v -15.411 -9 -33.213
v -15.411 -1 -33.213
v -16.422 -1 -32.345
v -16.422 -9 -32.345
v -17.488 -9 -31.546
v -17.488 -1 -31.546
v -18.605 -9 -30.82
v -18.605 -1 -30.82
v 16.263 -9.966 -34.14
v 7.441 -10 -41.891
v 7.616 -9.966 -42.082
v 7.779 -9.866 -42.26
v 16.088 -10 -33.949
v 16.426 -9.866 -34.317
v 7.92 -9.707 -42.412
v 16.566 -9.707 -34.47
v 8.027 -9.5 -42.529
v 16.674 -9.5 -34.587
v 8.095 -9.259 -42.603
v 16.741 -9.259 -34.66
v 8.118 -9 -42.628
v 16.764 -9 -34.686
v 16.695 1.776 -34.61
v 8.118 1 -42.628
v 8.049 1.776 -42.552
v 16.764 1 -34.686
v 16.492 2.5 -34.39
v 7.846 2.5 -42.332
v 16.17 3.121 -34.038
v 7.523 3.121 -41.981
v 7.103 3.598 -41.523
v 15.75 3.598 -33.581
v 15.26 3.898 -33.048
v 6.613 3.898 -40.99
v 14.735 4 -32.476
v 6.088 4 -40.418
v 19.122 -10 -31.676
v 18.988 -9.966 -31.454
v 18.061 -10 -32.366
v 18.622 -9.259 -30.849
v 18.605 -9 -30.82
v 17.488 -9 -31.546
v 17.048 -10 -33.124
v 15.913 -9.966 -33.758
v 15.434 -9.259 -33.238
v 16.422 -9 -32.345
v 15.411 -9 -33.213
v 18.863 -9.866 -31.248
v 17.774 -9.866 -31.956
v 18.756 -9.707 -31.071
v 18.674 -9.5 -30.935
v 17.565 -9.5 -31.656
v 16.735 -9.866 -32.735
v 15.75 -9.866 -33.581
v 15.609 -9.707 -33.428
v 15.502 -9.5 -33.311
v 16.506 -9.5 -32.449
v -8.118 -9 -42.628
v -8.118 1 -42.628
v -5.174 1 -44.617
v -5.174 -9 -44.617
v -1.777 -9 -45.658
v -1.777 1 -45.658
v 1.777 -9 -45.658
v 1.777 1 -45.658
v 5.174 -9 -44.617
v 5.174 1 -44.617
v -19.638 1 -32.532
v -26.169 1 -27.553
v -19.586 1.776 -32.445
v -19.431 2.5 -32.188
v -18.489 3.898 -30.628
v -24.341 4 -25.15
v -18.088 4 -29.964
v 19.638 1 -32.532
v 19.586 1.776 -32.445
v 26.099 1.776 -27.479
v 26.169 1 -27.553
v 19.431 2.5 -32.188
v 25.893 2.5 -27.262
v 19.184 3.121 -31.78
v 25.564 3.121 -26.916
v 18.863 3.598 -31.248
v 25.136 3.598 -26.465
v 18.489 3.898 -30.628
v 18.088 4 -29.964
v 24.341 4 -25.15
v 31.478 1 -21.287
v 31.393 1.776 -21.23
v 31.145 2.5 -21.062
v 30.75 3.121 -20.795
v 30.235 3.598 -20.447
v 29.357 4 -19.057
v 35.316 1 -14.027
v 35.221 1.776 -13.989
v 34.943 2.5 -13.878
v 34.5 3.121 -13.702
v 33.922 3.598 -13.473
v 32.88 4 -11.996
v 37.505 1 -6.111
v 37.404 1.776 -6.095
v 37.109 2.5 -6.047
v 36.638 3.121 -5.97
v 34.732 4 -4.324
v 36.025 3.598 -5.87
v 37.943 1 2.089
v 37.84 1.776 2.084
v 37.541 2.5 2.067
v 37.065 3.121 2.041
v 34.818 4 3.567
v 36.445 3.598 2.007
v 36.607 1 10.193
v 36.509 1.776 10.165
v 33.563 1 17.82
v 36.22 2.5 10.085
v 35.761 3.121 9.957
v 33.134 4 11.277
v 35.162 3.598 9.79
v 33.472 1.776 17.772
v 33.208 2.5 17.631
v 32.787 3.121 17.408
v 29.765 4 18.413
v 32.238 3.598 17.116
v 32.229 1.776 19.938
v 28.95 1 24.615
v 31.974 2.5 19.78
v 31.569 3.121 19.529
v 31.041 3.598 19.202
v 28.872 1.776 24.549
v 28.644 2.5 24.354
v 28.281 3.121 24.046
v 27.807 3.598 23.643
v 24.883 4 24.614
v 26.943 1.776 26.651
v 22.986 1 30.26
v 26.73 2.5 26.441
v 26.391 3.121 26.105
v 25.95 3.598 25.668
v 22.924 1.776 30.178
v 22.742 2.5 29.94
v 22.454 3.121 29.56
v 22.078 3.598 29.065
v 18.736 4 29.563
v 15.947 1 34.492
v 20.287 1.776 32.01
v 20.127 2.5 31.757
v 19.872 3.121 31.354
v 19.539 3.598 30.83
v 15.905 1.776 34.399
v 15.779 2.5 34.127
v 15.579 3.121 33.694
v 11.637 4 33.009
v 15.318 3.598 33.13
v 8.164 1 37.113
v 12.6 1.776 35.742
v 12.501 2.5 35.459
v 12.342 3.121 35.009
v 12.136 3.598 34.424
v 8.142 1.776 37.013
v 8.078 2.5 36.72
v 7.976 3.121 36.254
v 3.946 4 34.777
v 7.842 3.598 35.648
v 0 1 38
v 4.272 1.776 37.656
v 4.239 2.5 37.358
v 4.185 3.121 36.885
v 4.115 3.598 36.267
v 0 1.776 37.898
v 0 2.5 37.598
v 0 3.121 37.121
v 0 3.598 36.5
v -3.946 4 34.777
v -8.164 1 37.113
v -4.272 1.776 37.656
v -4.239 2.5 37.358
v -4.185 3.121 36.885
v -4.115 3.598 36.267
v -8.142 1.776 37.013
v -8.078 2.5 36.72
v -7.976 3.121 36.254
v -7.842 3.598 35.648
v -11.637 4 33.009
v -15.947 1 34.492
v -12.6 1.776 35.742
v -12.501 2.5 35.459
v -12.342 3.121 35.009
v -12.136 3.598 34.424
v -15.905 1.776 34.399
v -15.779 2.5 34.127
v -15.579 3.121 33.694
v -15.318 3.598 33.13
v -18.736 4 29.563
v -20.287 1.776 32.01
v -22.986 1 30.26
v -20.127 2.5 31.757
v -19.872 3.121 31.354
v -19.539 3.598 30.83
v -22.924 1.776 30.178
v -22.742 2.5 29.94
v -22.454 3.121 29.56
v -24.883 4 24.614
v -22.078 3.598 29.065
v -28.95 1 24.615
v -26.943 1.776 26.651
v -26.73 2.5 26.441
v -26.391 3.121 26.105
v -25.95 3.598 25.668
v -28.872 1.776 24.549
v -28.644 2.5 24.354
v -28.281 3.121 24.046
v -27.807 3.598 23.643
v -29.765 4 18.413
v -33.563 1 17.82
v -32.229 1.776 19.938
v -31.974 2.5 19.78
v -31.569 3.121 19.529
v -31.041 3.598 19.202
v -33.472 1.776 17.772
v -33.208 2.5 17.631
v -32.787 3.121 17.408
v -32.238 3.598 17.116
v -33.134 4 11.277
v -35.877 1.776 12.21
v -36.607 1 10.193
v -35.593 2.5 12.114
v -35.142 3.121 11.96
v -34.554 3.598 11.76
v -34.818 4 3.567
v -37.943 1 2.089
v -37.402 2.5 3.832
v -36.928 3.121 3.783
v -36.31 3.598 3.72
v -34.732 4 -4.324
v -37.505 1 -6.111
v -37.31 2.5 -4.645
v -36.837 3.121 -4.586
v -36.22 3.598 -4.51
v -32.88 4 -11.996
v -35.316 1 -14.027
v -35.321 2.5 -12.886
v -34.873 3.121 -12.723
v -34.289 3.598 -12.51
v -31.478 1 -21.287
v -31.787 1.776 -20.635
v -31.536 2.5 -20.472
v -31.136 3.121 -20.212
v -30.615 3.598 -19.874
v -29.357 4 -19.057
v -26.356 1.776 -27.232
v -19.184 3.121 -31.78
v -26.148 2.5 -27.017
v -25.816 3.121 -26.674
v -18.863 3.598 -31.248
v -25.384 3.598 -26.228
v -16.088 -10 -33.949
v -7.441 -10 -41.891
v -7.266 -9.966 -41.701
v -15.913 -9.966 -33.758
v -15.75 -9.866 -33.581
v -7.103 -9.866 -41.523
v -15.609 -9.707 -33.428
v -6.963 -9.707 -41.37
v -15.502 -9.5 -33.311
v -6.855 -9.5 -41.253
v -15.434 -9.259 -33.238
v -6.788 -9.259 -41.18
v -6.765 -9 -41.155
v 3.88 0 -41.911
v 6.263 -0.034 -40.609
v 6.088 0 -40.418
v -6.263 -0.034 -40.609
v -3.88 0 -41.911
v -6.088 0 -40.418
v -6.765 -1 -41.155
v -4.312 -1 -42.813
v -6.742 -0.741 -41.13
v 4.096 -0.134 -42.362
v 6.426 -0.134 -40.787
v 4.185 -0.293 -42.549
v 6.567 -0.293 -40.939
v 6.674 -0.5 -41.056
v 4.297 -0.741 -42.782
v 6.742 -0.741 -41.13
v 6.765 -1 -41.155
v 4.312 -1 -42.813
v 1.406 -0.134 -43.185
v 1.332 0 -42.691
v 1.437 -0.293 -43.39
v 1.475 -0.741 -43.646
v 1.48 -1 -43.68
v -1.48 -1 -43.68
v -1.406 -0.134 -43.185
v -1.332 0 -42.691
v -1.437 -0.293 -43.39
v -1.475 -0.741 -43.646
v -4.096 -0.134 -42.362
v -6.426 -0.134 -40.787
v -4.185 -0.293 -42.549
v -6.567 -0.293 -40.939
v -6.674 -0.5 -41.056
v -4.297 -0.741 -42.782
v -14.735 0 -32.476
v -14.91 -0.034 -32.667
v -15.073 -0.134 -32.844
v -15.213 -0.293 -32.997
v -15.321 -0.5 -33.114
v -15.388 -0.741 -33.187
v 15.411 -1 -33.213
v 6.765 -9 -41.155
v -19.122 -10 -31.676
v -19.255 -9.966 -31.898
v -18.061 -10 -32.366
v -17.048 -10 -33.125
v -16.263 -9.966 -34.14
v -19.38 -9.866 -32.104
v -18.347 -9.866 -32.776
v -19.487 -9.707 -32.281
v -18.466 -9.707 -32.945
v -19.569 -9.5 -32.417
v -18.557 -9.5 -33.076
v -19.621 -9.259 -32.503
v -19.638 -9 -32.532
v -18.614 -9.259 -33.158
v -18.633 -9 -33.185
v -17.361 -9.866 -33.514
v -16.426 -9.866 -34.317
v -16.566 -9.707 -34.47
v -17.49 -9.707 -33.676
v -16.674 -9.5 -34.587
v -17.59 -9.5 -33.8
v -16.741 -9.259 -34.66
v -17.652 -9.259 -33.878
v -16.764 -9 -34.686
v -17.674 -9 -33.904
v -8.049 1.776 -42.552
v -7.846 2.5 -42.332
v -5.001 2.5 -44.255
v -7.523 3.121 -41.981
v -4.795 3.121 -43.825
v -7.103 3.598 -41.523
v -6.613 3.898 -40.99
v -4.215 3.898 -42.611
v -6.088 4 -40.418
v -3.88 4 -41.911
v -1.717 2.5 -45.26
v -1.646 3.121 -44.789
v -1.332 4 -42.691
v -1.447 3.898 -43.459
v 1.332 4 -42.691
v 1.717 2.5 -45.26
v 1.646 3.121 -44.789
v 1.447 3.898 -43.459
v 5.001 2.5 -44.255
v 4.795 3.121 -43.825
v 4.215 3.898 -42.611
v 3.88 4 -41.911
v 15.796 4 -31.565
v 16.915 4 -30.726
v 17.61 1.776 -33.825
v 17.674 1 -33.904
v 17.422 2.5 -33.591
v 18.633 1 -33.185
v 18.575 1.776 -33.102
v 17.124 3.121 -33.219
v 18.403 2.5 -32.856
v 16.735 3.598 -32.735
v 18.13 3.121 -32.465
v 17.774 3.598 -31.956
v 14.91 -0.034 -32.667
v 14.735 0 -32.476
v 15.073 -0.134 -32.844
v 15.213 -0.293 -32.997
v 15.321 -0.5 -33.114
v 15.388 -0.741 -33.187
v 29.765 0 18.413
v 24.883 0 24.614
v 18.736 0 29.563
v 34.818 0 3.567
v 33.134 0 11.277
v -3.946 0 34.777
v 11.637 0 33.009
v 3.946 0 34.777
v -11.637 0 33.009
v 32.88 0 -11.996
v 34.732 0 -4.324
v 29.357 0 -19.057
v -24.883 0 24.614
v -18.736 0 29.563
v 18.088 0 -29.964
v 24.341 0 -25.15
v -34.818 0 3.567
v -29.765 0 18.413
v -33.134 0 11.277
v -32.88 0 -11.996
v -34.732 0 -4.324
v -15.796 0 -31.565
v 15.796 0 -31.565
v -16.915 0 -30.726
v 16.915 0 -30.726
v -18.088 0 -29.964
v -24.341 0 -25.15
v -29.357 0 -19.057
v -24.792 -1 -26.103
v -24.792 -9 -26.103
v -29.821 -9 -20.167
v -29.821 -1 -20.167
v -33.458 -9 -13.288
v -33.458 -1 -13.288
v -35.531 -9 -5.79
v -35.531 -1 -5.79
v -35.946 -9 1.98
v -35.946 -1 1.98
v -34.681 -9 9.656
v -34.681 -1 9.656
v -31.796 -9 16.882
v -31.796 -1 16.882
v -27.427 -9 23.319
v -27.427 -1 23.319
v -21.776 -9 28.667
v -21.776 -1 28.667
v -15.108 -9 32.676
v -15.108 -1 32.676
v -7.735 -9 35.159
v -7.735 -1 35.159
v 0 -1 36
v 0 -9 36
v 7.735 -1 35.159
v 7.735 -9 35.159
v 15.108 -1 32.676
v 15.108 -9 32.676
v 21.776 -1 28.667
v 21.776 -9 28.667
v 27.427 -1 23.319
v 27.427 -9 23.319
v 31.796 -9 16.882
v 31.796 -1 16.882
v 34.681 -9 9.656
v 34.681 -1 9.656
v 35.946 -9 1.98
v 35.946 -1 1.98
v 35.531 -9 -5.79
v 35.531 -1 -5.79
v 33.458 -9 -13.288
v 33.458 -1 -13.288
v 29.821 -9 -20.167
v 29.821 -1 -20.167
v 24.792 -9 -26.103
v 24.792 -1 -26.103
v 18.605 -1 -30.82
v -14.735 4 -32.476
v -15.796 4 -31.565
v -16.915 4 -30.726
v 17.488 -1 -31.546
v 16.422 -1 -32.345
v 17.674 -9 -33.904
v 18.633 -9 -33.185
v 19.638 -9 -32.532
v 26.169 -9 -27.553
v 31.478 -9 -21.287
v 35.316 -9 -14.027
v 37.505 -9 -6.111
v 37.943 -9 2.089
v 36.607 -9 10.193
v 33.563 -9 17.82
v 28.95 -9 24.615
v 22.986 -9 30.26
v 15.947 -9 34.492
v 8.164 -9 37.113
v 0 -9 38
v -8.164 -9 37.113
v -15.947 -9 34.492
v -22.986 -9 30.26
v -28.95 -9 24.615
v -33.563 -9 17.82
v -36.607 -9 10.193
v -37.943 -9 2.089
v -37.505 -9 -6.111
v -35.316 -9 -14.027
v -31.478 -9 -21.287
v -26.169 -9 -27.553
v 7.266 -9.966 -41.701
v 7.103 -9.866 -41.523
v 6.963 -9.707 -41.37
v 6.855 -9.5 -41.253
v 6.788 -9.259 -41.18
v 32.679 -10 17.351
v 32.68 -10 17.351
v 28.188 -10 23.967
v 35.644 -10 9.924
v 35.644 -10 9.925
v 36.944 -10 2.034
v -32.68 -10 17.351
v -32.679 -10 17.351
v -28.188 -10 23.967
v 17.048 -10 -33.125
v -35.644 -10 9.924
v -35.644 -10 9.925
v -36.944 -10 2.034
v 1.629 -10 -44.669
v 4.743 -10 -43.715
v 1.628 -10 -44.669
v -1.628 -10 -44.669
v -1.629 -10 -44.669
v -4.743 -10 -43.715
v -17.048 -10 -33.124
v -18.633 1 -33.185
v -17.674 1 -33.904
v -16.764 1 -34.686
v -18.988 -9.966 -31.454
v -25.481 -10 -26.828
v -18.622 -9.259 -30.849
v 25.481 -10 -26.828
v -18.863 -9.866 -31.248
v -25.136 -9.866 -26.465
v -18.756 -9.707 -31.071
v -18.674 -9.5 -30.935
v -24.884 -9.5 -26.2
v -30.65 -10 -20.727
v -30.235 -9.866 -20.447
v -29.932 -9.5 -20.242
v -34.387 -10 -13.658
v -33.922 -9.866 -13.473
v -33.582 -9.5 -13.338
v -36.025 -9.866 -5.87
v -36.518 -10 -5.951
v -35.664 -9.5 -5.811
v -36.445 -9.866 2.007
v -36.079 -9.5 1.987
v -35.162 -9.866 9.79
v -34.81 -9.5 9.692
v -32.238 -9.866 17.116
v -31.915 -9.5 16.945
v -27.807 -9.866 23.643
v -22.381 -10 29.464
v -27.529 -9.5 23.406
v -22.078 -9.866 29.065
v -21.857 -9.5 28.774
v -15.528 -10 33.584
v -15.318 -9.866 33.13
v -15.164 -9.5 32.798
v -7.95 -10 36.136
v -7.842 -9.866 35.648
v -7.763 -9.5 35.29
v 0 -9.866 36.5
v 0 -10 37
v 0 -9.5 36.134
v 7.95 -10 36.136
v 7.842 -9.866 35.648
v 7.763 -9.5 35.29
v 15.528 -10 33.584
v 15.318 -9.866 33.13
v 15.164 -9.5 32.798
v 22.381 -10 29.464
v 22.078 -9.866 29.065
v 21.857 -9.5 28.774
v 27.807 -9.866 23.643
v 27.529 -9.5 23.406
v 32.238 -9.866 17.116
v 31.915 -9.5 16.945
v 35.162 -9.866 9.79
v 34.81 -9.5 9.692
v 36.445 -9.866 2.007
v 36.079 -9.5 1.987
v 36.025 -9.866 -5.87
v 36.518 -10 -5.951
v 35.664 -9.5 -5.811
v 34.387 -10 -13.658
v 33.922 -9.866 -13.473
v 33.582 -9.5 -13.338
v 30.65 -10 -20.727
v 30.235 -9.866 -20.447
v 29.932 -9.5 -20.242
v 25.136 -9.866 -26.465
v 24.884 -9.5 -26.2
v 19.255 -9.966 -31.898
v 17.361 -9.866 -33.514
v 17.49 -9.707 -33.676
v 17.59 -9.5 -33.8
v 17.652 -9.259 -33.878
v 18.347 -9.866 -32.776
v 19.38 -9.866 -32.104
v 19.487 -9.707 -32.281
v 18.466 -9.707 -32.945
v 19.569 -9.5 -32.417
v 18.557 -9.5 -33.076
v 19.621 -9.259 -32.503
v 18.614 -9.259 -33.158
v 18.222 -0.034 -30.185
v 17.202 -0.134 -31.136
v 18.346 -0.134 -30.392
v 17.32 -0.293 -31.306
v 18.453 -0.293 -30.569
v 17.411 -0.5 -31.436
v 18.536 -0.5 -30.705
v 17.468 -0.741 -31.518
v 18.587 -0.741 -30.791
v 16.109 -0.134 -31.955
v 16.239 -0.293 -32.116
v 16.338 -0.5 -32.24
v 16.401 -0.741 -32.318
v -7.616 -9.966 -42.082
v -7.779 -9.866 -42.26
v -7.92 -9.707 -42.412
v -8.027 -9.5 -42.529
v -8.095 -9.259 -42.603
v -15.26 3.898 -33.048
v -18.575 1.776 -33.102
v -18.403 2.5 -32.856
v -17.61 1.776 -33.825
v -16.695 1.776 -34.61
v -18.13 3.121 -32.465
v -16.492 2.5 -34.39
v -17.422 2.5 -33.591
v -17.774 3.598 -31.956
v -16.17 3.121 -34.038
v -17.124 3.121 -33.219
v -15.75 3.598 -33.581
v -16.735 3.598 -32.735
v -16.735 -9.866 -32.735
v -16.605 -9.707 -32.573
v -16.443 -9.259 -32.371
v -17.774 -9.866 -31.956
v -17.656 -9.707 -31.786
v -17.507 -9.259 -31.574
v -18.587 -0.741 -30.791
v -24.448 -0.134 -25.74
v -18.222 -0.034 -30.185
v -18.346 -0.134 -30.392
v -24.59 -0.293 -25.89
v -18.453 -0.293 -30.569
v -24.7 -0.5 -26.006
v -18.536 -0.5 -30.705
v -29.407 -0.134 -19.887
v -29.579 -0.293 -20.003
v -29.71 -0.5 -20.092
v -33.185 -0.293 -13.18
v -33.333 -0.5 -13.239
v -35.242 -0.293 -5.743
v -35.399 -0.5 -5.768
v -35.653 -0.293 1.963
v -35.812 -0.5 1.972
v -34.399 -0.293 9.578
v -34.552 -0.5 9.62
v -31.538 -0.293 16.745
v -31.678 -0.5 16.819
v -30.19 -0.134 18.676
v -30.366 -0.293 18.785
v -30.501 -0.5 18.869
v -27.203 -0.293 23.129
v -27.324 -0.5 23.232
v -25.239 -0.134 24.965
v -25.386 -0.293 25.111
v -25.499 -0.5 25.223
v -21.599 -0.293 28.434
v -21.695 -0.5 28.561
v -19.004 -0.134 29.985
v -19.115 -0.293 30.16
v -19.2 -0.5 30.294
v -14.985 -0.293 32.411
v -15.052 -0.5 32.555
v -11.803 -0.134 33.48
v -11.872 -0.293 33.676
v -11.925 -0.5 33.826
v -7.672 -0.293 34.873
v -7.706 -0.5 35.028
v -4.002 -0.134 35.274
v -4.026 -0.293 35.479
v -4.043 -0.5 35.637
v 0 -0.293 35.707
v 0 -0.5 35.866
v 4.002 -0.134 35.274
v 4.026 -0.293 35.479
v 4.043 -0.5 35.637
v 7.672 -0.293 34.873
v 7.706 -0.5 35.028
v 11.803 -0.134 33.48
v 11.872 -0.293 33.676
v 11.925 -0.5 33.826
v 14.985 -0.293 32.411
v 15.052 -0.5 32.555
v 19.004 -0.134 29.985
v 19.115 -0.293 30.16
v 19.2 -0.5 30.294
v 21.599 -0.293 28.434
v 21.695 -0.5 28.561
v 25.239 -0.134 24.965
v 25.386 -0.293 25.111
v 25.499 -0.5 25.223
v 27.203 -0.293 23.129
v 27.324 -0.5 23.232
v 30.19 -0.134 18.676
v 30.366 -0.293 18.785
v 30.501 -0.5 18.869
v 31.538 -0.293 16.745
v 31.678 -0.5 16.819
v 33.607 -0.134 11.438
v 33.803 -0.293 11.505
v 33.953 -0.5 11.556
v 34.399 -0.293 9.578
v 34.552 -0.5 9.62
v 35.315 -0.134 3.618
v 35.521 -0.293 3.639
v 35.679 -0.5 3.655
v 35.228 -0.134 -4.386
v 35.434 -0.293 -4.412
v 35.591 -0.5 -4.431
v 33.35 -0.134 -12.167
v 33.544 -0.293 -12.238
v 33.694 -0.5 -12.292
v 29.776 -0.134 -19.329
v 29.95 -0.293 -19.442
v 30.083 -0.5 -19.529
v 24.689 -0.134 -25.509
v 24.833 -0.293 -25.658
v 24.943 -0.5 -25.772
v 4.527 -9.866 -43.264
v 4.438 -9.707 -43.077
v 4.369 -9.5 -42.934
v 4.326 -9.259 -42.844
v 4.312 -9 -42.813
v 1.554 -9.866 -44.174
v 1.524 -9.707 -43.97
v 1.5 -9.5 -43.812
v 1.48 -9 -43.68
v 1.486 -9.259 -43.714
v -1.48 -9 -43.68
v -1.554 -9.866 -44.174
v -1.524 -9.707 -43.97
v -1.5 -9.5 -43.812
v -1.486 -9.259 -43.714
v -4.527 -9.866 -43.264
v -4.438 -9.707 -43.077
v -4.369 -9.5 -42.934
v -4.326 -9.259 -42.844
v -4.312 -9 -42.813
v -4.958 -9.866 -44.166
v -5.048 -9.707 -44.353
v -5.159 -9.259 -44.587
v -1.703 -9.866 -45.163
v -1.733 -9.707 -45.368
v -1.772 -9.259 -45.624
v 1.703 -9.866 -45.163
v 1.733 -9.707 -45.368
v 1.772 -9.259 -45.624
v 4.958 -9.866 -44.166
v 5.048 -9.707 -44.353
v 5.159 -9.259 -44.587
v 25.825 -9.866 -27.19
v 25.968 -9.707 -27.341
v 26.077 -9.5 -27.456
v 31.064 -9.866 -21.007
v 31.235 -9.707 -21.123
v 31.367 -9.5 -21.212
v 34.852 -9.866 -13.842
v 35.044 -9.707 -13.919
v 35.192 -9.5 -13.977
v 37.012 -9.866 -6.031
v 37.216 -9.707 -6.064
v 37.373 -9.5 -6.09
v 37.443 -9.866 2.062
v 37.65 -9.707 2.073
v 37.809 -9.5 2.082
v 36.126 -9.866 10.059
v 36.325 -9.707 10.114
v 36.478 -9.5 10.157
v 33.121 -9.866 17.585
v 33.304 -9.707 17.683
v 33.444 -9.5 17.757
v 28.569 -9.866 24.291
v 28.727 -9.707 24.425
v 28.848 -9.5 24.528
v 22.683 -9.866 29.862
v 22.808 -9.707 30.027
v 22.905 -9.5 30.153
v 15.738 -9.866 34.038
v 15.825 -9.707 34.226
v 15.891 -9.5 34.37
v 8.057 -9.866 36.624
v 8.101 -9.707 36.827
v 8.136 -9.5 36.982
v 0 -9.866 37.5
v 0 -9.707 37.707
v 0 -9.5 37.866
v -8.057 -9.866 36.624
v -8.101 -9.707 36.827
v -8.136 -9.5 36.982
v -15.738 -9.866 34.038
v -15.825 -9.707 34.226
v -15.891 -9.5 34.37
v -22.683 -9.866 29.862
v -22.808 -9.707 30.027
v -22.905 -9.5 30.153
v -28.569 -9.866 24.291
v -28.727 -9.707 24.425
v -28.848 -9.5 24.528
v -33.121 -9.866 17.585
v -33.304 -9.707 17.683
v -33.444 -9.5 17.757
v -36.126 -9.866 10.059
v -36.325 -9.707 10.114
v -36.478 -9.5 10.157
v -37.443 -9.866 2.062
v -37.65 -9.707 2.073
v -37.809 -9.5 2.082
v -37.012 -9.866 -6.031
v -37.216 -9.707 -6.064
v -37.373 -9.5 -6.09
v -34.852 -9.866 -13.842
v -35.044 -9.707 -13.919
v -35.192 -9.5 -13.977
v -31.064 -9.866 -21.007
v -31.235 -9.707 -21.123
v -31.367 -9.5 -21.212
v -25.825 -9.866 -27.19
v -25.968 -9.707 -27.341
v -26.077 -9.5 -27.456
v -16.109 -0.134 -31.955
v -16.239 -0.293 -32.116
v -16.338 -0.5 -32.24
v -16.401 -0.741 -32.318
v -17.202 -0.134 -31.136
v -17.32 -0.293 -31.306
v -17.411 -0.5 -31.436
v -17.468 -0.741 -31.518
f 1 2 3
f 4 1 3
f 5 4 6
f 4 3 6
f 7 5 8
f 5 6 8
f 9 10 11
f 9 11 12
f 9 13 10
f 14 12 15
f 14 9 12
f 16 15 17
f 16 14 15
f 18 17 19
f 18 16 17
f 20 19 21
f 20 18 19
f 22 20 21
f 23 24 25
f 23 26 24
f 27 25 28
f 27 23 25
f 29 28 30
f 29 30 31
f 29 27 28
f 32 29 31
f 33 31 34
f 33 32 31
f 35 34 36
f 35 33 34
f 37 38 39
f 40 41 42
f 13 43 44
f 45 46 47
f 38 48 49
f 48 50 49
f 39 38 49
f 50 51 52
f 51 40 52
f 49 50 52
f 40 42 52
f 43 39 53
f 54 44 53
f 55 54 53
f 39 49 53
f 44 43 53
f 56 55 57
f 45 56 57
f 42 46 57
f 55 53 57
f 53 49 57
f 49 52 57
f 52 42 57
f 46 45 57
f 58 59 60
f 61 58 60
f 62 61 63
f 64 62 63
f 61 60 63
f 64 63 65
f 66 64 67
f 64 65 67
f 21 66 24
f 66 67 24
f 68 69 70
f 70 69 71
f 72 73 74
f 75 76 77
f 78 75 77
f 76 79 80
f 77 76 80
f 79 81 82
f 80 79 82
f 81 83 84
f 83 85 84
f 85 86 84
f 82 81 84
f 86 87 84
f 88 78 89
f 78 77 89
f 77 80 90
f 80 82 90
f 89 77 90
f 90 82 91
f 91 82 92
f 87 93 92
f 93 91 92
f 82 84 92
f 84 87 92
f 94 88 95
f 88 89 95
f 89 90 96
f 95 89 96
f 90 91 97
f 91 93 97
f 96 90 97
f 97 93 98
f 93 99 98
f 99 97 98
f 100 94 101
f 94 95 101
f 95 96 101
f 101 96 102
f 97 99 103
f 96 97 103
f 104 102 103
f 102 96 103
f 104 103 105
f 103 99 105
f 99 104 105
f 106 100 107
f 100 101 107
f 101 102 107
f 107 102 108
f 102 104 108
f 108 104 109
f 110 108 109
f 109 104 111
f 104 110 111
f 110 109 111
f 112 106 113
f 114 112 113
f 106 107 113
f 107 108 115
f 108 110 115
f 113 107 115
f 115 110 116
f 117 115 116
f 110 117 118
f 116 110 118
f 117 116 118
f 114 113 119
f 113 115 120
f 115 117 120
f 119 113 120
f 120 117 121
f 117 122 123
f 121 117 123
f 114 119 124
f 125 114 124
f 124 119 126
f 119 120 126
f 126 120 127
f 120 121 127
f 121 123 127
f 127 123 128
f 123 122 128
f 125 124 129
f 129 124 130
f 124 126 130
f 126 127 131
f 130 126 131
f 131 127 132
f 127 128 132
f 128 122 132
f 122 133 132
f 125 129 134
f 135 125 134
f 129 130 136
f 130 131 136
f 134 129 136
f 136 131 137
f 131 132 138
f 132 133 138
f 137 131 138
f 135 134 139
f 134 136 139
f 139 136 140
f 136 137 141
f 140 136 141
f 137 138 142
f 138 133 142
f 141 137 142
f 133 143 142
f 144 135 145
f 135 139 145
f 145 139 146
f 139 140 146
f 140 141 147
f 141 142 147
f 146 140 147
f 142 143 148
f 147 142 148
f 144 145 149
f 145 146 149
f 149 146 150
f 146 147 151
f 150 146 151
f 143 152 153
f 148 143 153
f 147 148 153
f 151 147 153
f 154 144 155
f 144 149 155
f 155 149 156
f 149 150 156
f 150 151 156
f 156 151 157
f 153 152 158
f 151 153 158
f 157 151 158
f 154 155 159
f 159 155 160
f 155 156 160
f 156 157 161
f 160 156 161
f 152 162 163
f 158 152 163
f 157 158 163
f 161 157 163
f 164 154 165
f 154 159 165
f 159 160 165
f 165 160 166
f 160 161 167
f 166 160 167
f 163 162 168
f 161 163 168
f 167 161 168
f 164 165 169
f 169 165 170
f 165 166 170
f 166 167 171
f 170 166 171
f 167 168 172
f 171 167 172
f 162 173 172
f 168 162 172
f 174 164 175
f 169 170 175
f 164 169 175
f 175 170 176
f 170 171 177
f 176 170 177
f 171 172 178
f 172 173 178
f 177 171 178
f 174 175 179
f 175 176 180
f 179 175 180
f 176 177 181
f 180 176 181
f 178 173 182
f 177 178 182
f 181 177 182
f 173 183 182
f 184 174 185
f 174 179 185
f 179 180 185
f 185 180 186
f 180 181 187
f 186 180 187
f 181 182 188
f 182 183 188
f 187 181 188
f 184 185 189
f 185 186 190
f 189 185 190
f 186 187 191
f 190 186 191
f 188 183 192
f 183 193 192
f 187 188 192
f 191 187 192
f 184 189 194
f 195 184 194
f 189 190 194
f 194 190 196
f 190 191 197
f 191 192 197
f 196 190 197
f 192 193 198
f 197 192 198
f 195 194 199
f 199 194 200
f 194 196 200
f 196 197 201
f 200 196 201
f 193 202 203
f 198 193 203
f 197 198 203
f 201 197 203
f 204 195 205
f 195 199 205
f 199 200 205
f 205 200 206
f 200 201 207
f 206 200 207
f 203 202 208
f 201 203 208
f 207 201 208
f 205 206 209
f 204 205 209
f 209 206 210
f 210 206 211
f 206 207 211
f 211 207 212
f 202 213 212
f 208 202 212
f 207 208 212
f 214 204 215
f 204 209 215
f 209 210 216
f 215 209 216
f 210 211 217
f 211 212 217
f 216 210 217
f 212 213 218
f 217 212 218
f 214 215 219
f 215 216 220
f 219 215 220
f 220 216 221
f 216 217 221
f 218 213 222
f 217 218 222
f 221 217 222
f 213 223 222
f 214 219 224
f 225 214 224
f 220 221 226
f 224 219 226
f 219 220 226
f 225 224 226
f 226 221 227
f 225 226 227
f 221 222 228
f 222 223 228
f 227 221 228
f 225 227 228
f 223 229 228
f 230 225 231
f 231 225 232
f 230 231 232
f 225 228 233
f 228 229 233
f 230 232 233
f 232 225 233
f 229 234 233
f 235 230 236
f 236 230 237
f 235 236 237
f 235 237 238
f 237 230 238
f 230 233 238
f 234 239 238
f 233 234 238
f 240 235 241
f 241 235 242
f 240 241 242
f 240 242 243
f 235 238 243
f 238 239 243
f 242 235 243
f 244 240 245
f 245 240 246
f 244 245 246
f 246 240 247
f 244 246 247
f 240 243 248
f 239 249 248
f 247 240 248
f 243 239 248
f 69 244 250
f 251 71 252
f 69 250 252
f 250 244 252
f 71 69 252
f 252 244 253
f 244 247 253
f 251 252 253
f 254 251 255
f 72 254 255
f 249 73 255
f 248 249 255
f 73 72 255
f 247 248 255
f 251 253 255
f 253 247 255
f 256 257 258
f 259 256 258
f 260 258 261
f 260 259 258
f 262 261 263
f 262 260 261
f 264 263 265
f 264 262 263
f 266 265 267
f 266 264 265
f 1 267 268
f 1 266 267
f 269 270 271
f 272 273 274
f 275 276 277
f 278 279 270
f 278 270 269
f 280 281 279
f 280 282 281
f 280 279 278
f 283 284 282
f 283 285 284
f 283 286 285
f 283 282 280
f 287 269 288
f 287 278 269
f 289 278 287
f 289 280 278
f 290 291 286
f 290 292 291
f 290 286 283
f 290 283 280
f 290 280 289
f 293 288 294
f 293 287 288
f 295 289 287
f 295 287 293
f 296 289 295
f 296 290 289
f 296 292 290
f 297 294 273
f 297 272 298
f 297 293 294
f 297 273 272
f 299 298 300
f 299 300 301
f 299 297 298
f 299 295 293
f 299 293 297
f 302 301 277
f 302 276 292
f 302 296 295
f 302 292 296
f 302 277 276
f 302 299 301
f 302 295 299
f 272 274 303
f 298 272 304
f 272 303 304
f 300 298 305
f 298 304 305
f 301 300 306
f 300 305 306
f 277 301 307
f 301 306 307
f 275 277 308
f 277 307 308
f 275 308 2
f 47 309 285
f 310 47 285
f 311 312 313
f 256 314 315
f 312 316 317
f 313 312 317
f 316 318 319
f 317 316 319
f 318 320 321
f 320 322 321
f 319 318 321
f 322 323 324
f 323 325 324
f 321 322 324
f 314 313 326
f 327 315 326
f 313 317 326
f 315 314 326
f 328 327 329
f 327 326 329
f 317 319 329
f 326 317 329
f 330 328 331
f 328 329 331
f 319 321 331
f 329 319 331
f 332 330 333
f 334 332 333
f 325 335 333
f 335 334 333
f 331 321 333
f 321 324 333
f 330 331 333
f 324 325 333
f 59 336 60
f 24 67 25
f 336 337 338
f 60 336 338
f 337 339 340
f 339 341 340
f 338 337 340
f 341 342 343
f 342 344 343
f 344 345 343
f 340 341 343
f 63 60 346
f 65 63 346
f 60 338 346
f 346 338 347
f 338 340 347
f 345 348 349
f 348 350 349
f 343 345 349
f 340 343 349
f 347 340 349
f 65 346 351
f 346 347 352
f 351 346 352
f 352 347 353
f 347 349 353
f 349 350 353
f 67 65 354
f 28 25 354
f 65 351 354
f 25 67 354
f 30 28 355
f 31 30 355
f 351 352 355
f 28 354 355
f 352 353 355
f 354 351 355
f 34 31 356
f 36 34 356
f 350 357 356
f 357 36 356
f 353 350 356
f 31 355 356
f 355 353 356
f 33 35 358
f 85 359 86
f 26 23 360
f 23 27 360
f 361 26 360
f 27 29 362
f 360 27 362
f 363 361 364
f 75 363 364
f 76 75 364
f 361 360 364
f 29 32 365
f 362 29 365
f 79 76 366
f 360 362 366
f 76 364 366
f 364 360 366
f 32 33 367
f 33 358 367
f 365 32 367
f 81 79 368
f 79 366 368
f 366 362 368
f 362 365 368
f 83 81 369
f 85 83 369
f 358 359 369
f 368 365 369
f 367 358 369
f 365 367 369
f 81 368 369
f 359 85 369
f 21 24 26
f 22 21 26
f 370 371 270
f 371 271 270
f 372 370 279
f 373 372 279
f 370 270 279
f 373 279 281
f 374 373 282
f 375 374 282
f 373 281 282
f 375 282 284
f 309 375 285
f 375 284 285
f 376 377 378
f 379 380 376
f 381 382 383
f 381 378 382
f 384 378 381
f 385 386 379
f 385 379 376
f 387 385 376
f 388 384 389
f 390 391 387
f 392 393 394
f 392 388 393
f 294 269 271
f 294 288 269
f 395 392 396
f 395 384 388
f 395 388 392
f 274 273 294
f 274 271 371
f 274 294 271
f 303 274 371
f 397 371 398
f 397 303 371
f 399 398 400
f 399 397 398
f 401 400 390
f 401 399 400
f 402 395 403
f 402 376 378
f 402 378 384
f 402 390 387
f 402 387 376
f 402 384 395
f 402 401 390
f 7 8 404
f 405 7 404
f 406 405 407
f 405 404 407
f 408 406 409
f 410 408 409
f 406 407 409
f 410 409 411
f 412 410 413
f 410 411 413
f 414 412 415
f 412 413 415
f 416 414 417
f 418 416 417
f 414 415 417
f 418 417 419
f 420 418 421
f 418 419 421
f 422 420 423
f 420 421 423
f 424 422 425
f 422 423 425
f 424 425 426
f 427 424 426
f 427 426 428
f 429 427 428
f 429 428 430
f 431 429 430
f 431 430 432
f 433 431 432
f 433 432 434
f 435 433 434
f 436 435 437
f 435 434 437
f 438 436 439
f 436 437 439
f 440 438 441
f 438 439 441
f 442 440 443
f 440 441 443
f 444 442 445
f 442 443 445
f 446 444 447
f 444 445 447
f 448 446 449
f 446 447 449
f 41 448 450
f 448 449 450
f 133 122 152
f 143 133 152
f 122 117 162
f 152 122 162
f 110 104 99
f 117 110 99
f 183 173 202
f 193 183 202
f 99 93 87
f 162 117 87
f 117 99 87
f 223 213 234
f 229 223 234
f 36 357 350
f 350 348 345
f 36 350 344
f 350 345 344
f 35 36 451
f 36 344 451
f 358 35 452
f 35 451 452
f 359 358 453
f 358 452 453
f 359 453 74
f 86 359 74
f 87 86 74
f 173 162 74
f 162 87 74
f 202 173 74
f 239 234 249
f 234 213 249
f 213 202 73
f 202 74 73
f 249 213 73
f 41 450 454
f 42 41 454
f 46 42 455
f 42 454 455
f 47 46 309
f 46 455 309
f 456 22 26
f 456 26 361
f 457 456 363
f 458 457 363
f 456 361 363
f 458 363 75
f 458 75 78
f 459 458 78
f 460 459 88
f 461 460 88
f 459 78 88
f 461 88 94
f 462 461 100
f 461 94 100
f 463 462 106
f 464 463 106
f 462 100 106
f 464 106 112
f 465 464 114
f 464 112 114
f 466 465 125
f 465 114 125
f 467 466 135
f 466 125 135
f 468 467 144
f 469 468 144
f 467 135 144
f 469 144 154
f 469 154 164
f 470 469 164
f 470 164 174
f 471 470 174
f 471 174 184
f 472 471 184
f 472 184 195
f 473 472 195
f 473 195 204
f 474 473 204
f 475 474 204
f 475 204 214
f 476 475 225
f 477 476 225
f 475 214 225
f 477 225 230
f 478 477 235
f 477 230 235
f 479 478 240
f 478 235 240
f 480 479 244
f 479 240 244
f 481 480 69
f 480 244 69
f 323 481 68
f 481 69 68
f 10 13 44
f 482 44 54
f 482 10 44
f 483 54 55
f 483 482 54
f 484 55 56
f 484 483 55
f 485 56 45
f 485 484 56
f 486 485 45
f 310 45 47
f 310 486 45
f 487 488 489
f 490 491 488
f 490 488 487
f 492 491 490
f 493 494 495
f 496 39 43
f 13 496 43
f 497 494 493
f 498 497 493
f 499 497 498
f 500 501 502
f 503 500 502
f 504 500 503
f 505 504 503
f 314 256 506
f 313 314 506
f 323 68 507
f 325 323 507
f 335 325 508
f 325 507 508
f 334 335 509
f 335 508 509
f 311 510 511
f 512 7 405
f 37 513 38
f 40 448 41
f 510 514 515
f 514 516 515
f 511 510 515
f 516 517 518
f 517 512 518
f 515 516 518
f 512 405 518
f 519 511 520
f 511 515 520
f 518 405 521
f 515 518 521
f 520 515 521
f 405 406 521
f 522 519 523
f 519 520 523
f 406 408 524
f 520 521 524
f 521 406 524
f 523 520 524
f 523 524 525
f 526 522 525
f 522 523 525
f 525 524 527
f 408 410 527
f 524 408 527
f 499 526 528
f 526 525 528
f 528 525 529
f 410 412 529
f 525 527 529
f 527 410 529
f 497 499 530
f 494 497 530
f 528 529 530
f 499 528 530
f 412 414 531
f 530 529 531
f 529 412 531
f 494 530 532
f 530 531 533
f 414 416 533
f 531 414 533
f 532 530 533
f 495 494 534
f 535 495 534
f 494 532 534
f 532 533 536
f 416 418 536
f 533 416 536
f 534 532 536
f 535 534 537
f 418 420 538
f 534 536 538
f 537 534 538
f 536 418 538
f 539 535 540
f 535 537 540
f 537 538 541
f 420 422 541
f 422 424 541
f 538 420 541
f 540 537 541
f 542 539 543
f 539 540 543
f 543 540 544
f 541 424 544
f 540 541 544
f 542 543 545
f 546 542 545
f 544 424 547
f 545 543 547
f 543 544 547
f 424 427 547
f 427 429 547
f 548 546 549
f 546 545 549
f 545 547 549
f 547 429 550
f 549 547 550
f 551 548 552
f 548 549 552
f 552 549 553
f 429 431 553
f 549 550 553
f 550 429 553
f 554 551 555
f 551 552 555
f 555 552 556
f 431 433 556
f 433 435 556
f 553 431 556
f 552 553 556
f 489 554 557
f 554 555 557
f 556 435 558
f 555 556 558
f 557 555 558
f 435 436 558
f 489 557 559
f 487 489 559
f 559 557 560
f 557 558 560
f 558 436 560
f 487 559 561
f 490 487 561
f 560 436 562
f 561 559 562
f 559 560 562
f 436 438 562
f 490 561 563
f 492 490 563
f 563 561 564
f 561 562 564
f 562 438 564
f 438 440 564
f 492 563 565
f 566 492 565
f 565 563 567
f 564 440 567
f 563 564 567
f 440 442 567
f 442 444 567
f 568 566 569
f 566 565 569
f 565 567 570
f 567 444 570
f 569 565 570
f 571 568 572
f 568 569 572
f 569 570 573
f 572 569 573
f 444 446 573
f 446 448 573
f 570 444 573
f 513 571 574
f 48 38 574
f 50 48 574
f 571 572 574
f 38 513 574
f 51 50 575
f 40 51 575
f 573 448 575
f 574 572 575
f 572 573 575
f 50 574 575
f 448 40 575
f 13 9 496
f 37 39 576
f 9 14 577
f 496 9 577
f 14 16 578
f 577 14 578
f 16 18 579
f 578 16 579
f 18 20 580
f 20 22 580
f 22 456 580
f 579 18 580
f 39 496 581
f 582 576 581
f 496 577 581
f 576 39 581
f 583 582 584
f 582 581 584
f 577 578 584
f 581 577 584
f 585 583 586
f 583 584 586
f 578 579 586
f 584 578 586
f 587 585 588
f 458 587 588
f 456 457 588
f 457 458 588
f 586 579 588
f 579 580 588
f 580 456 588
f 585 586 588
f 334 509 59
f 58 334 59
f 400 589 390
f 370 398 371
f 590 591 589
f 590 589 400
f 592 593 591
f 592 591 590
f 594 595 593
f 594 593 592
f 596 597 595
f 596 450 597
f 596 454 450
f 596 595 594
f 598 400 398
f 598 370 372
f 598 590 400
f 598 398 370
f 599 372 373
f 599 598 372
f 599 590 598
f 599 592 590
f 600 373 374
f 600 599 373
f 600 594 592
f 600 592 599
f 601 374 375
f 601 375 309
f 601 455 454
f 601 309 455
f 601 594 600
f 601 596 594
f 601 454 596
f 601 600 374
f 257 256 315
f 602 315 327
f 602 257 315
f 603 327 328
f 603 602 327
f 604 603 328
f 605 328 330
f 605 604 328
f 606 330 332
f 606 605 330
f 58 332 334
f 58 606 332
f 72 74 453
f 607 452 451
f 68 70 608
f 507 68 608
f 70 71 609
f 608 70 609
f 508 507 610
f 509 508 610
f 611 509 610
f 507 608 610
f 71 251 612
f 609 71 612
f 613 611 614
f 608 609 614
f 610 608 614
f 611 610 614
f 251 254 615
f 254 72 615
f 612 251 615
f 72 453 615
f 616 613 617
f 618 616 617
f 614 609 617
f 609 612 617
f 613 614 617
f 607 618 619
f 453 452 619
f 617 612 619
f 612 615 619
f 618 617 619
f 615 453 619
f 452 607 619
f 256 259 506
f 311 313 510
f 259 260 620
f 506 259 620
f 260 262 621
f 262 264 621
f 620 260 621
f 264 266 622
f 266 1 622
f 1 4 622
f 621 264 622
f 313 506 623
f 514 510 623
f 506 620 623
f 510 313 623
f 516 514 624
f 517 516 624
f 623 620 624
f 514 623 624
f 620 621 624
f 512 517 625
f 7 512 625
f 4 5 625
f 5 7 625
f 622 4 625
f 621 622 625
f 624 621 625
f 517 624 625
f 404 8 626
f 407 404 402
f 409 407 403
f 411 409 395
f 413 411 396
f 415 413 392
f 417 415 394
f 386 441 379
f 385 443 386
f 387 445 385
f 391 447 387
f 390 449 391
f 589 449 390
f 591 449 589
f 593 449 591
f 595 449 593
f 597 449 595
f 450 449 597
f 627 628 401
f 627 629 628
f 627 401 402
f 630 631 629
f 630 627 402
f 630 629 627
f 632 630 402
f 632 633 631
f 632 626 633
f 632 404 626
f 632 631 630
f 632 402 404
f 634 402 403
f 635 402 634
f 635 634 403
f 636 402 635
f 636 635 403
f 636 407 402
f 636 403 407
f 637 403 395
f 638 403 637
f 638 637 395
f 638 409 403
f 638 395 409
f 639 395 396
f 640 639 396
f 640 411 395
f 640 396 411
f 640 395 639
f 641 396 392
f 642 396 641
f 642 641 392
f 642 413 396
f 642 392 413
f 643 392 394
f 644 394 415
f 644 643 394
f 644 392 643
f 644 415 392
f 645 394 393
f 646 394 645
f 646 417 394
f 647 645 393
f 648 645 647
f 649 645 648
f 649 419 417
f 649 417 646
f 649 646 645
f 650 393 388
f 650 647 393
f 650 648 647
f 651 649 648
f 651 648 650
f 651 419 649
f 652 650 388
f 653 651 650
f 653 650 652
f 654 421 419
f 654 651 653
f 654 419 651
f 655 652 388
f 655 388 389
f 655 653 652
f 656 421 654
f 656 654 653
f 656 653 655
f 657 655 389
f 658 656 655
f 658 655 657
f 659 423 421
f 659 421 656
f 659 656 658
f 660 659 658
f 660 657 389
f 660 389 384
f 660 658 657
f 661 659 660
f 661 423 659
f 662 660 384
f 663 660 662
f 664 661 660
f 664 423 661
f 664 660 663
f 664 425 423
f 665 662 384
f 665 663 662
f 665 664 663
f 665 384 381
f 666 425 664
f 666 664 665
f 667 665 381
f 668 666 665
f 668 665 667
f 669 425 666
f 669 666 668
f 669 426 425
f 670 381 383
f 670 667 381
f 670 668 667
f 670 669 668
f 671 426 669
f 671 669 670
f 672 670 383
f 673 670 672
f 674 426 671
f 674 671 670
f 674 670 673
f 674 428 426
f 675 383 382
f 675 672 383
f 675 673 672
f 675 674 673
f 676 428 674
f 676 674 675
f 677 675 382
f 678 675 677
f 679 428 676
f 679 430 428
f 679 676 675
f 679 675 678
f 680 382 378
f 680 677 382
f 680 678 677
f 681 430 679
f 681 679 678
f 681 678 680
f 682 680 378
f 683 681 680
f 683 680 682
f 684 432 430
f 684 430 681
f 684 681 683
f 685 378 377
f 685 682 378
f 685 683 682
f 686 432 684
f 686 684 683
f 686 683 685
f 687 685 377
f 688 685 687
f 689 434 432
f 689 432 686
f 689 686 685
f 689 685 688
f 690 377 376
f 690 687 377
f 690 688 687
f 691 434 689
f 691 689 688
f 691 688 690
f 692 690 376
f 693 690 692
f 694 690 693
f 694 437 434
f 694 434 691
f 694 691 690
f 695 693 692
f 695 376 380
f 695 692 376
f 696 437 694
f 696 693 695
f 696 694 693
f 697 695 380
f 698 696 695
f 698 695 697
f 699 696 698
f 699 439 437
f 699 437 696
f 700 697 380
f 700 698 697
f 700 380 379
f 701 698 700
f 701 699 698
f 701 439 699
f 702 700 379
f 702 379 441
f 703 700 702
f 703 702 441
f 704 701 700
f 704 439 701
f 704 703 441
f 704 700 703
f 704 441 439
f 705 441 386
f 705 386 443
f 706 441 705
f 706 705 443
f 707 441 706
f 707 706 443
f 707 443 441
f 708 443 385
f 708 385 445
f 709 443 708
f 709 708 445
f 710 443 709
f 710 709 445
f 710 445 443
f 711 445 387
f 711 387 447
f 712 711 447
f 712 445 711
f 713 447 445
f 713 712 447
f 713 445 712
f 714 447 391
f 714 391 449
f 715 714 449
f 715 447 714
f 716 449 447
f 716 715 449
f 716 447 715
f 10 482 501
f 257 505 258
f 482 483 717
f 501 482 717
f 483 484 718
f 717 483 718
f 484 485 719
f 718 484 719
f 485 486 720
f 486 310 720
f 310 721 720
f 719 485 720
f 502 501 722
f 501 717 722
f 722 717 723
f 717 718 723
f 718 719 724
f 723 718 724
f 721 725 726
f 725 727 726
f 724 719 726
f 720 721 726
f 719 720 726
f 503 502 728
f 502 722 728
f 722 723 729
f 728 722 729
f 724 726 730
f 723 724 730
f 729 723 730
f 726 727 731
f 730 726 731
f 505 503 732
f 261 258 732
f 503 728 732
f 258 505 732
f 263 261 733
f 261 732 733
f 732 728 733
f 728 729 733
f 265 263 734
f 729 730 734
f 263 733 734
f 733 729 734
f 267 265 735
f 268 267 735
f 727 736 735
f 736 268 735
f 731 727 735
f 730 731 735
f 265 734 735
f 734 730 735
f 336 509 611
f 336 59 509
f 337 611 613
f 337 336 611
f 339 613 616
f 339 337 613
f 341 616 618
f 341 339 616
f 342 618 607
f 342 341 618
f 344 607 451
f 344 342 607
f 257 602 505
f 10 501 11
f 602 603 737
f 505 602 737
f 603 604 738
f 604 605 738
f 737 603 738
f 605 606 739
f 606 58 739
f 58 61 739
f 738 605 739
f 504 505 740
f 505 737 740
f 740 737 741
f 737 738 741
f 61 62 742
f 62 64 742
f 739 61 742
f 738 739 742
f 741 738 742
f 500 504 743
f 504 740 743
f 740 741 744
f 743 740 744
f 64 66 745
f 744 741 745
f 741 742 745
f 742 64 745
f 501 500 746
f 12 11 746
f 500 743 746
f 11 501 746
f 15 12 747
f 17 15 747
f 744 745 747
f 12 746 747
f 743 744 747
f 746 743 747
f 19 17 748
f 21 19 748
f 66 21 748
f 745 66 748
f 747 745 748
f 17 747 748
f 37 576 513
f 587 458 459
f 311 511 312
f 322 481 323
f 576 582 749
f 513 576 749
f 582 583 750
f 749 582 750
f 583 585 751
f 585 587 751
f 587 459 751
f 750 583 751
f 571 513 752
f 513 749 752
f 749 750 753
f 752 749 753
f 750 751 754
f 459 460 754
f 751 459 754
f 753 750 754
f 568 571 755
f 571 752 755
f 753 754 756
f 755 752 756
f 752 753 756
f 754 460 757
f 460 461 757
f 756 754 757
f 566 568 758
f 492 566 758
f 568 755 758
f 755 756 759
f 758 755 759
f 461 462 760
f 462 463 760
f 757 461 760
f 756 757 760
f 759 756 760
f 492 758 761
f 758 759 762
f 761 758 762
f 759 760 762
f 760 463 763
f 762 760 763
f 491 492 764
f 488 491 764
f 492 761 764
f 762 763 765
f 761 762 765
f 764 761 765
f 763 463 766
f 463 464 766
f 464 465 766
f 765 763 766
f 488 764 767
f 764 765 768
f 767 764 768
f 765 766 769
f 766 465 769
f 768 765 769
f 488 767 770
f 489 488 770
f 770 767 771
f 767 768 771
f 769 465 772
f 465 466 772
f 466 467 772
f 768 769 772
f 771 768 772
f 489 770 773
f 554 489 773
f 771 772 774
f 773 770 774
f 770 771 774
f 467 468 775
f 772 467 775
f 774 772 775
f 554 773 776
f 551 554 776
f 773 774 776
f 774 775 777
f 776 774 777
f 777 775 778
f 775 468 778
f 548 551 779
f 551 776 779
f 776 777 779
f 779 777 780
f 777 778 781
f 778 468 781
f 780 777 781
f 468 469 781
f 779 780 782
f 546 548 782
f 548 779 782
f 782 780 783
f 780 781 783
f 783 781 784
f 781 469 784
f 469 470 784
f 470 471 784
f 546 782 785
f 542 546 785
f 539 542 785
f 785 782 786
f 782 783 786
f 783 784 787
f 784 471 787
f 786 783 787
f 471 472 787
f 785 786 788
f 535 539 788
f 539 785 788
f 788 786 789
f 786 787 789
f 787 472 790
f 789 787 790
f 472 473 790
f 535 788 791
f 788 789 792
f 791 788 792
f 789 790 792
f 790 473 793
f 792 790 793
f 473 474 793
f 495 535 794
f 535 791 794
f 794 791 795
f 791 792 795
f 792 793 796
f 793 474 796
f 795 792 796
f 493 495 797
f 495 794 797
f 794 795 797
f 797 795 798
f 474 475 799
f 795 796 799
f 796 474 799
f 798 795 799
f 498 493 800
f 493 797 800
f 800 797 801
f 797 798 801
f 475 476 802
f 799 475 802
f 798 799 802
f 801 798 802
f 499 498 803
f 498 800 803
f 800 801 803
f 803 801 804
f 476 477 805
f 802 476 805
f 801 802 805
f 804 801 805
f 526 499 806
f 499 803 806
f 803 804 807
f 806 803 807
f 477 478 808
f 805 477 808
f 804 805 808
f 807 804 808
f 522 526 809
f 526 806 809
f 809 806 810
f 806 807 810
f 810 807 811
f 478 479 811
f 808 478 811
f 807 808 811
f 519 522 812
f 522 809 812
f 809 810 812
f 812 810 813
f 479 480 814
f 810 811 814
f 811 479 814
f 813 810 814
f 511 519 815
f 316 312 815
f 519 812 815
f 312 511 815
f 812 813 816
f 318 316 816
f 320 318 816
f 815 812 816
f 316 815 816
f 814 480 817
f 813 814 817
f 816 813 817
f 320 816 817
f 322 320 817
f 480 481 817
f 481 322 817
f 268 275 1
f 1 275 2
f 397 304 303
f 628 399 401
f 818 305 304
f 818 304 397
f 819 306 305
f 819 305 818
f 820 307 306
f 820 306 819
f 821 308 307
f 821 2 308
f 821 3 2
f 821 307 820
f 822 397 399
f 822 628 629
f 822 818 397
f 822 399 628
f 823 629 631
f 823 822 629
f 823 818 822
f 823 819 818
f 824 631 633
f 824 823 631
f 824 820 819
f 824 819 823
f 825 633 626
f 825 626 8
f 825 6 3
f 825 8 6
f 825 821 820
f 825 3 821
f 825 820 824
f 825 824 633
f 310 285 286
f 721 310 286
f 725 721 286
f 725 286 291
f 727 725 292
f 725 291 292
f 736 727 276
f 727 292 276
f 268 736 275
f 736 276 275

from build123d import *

# Parameters (mm, degrees)
BOSS_EXTRUDE1_DEPTH = 10
BOSS_EXTRUDE2_START = 4
BOSS_EXTRUDE2_DEPTH = 4
FILLET1_R           = 1
FILLET2_R           = 3
FILLET3_R           = 1


with BuildPart() as part:
    # Sketch2 → Boss-Extrude1 (new body)
    with BuildSketch(Plane(origin=(0, 0, 0), x_dir=(1, 0, 0), z_dir=(0, 1, 0))):
        with BuildLine():
            Line((8.117655452, 42.627745196), (16.764304352, 34.685510469))
            ThreePointArc((16.764304352, 34.685510469), (18.147506186, 33.536916036), (19.638391538, 32.53203925))
            ThreePointArc((19.638391538, 32.53203925), (0, -38), (-19.638391538, 32.53203925))
            ThreePointArc((-19.638391538, 32.53203925), (-18.147506186, 33.536916036), (-16.764304352, 34.685510469))
            Line((-16.764304352, 34.685510469), (-8.117655452, 42.627745196))
            ThreePointArc((-8.117655452, 42.627745196), (0, 45.790117123), (8.117655452, 42.627745196))
        make_face()
        with BuildLine():
            Line((-6.764712877, 41.154807184), (-15.411361777, 33.212572457))
            ThreePointArc((-15.411361777, 33.212572457), (-16.948252704, 31.93635642), (-18.604791984, 30.819826658))
            ThreePointArc((-18.604791984, 30.819826658), (0, -36), (18.604791984, 30.819826658))
            ThreePointArc((18.604791984, 30.819826658), (16.948252704, 31.93635642), (15.411361777, 33.212572457))
            Line((15.411361777, 33.212572457), (6.764712877, 41.154807184))
            ThreePointArc((6.764712877, 41.154807184), (0, 43.790117123), (-6.764712877, 41.154807184))
        make_face(mode=Mode.SUBTRACT)
    extrude(amount=-BOSS_EXTRUDE1_DEPTH)

    # Sketch2<2> → Boss-Extrude2 (add)
    with BuildSketch(Plane(origin=(0, 0, 0), x_dir=(1, 0, 0), z_dir=(0, 1, 0)).offset(BOSS_EXTRUDE2_START)):
        with BuildLine():
            Line((8.117655452, 42.627745196), (16.764304352, 34.685510469))
            ThreePointArc((16.764304352, 34.685510469), (18.147506186, 33.536916036), (19.638391538, 32.53203925))
            ThreePointArc((19.638391538, 32.53203925), (0, -38), (-19.638391538, 32.53203925))
            ThreePointArc((-19.638391538, 32.53203925), (-18.147506186, 33.536916036), (-16.764304352, 34.685510469))
            Line((-16.764304352, 34.685510469), (-8.117655452, 42.627745196))
            ThreePointArc((-8.117655452, 42.627745196), (0, 45.790117123), (8.117655452, 42.627745196))
        make_face()
    extrude(amount=-BOSS_EXTRUDE2_DEPTH)

    # Fillet1
    fillet1_edges = [part.edges().sort_by_distance(p)[0] for p in [
        (16.948252704, 0, -31.93635642),
        (11.088037327, 0, -37.183689821),
        (0, 0, -43.790117123),
        (-11.088037327, 0, -37.183689821),
        (-16.948252704, 0, -31.93635642),
        (0, 0, 36),
    ]]
    fillet(fillet1_edges, radius=FILLET1_R)

    # Fillet2
    fillet2_edges = [part.edges().sort_by_distance(p)[0] for p in [
        (-18.147506186, 4, -33.536916036),
        (12.440979902, 4, -38.656627833),
        (0, 4, -45.790117123),
        (0, 4, 38),
        (18.147506186, 4, -33.536916036),
        (-12.440979902, 4, -38.656627833),
    ]]
    fillet(fillet2_edges, radius=FILLET2_R)

    # Fillet3
    fillet3_edges = [part.edges().sort_by_distance(p)[0] for p in [
        (18.147506186, -10, -33.536916036),
        (12.440979902, -10, -38.656627833),
        (0, -10, -45.790117123),
        (16.948252704, -10, -31.93635642),
        (0, -10, 36),
        (-16.948252704, -10, -31.93635642),
        (-11.088037327, -10, -37.183689821),
        (0, -10, -43.790117123),
        (11.088037327, -10, -37.183689821),
        (-12.440979902, -10, -38.656627833),
        (-18.147506186, -10, -33.536916036),
        (0, -10, 38),
    ]]
    fillet(fillet3_edges, radius=FILLET3_R - 0.0001)  # a hair under: the kernel refuses the full size


solid = part.part
